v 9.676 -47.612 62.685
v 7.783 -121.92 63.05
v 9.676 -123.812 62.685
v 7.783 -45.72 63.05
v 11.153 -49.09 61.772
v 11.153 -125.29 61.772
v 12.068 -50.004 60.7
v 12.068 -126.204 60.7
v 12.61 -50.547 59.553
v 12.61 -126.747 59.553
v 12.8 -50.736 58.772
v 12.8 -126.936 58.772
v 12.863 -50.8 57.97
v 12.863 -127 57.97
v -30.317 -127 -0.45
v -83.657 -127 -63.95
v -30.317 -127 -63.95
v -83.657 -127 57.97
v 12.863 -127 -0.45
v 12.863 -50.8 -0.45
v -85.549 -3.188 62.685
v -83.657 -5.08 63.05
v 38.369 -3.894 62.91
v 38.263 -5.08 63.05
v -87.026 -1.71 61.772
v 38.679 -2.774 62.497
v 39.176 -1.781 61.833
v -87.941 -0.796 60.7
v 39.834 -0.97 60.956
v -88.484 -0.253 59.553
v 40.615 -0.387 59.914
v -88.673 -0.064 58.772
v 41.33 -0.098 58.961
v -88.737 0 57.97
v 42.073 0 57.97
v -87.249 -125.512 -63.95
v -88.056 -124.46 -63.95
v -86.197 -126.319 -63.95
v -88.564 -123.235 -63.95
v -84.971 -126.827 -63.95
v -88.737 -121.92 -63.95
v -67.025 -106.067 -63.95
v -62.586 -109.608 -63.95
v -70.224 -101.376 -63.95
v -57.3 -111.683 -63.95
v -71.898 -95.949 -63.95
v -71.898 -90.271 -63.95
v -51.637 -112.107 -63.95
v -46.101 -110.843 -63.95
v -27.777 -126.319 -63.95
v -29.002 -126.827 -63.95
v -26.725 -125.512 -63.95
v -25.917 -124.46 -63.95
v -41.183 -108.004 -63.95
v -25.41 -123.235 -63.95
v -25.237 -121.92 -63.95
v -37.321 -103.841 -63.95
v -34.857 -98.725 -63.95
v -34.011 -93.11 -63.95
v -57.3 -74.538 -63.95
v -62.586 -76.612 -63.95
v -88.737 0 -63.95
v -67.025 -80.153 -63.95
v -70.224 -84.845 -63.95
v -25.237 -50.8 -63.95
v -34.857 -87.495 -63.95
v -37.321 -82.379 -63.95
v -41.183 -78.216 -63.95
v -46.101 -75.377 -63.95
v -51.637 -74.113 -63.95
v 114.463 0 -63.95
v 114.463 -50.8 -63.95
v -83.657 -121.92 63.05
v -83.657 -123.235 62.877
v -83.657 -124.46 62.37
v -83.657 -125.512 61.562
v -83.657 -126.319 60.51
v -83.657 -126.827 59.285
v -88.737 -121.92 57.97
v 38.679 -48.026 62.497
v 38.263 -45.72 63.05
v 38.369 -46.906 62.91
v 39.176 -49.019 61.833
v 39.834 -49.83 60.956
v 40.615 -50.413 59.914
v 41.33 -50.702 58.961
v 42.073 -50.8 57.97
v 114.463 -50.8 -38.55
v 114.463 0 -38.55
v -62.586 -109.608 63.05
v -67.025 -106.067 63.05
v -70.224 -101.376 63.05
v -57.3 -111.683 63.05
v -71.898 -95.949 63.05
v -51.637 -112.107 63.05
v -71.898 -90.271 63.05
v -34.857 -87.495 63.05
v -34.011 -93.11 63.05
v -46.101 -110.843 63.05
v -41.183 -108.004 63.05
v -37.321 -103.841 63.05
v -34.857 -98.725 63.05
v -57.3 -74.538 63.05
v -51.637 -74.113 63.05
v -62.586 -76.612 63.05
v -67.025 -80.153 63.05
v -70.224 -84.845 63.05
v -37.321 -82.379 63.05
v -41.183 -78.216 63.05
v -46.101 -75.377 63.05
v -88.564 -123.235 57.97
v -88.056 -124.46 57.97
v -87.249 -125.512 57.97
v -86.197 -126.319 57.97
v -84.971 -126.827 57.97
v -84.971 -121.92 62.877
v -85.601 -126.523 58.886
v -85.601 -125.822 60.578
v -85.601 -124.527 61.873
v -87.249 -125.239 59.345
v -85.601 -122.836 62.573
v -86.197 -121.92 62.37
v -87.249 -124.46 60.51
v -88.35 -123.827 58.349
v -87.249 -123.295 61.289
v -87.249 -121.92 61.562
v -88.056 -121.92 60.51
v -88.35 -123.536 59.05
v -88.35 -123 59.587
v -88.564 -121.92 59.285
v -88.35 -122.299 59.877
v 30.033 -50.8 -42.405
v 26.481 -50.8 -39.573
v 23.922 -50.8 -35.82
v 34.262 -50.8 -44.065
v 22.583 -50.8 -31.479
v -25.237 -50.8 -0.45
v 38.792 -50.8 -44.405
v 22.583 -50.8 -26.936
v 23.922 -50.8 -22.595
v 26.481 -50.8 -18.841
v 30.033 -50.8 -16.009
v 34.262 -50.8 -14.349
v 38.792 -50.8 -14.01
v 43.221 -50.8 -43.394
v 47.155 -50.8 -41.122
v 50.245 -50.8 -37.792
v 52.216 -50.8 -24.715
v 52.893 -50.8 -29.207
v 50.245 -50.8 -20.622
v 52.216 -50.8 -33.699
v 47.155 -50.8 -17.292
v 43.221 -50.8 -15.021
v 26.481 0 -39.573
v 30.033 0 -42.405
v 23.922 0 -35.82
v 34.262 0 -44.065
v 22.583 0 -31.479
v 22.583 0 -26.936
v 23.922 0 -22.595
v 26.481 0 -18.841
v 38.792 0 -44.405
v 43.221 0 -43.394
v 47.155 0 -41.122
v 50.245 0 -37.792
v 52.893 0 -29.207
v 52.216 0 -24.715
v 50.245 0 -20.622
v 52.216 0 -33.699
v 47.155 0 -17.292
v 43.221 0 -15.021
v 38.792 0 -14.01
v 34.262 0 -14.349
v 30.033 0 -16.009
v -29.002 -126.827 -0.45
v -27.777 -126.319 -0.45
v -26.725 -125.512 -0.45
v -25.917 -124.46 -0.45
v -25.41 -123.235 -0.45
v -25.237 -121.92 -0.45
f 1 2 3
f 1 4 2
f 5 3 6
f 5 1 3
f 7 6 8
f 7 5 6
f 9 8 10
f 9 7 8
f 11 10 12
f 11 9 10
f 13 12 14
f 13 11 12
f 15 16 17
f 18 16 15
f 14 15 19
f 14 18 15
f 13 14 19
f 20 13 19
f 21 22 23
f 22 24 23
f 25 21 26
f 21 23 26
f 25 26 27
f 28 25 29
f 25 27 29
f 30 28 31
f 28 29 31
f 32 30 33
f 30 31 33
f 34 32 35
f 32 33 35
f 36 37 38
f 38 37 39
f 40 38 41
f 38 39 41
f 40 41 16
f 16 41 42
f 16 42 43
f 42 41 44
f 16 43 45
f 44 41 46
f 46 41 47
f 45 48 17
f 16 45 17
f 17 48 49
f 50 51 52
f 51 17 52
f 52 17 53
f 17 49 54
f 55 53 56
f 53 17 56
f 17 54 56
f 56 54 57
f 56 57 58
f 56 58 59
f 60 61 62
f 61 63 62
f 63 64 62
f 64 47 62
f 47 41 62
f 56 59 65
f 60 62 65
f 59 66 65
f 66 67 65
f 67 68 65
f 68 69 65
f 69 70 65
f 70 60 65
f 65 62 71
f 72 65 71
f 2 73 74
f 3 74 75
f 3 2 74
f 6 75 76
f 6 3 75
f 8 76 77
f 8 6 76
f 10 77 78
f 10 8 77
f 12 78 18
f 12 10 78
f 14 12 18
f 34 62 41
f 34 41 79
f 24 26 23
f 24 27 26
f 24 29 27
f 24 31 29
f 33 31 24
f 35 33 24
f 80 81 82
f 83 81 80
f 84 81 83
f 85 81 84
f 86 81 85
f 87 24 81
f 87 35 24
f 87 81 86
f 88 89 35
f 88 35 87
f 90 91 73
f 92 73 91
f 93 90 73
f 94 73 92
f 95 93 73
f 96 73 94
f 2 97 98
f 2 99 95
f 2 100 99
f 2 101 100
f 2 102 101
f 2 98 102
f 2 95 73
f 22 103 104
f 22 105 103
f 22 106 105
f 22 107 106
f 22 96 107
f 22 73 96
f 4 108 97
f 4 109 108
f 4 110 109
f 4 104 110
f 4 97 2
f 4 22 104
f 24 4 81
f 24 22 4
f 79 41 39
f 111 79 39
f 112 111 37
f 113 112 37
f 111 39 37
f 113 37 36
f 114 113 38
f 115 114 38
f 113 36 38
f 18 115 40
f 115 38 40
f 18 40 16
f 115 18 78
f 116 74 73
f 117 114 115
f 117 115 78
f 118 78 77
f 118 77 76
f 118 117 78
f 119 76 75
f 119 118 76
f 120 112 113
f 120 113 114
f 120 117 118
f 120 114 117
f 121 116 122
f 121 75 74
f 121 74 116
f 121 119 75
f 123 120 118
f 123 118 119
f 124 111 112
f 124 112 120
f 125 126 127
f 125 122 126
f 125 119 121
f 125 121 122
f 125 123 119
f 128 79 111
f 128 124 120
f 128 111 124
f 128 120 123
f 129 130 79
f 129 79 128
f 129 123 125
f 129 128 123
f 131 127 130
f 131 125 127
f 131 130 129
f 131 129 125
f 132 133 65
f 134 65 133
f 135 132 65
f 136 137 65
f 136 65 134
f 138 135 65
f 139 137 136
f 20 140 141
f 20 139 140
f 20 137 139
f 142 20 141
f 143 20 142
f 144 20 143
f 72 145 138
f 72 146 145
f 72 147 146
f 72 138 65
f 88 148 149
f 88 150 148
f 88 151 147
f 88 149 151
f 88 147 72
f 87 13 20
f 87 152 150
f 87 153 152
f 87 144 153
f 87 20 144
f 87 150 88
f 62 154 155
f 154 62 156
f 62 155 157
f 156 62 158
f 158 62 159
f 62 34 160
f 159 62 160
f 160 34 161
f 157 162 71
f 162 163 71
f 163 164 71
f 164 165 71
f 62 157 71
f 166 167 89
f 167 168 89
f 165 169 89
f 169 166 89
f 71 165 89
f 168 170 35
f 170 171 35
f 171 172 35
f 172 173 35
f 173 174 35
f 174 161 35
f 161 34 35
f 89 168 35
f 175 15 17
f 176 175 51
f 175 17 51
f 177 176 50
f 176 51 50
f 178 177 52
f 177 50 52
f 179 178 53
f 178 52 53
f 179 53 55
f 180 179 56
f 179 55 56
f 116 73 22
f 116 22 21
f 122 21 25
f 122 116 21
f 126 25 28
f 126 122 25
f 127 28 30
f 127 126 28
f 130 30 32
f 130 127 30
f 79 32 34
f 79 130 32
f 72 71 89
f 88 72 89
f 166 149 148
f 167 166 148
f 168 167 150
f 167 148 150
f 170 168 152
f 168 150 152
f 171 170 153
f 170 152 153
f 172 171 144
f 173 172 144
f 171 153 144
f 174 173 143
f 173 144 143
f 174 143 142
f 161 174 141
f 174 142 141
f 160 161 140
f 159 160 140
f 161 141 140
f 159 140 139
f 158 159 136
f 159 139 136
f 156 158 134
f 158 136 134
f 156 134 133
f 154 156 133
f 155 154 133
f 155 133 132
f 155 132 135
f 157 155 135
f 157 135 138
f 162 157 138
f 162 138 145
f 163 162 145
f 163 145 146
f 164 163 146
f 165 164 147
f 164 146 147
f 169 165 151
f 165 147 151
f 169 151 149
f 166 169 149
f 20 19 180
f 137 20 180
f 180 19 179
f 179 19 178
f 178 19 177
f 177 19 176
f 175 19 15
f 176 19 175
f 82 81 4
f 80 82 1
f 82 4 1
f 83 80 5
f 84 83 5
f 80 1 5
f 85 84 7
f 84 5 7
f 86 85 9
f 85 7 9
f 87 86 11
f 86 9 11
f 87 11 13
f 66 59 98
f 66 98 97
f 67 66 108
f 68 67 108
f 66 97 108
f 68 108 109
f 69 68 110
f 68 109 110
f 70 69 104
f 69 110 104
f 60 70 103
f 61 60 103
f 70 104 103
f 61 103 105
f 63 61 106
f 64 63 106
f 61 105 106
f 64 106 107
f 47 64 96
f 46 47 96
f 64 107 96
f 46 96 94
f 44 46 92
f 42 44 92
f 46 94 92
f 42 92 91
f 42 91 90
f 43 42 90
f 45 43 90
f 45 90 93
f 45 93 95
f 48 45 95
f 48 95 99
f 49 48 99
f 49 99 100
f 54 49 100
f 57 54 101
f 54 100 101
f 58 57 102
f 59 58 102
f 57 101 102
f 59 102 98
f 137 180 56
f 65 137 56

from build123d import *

# Parameters (mm, degrees)
F0_W        = 203.2
F0_H        = 127
F1_DEPTH    = 127
F3_DEPTH    = 76.2
F4_SIZE2    = 101.6
F4_SIZE     = 76.2
F5_R        = 5.08
F6_T1_DEPTH = 76.2
F6_T3_DEPTH = 134.62
F6_S7_W     = 5.08
F6_S7_H     = 5.08
F6_T8_DEPTH = 5.08
F7_R        = 15.24
F8_DEPTH    = 50.8
F9_R        = 19.05
F10_DEPTH   = 127


# Not quite as in the source:
# - a fillet or chamfer that OpenCascade refuses, or shapes differently, is made with other operations: its cross-section is extruded or revolved along the edge and cut away or added


with BuildPart() as f1:
    # F0 (on Front) → F1 (new body)
    with BuildSketch(Plane.XZ):
        with Locations((12.863317194, -0.4497872638)):
            Rectangle(F0_W, F0_H)
    extrude(amount=F1_DEPTH)

    # F2 (on face) → F3 (cut)
    with BuildSketch(Plane.XZ.offset(127)):
        Polygon((114.463317194, 63.0502127362), (12.863317194, 63.0502127362), (12.863317194, -0.4497872638), (-25.236682806, -0.4497872638), (-25.236682806, -63.9497872638), (114.463317194, -63.9497872638), align=None)
    extrude(amount=-F3_DEPTH, mode=Mode.SUBTRACT)

    # F4
    f4_edges = [f1.edges().sort_by_distance(p)[0] for p in [
        (114.463317, -25.4, 63.050213),
    ]]
    f4_side = f1.faces().sort_by_distance((-8.908111, -52.614286, 63.050213))[0]
    chamfer(f4_edges, length=F4_SIZE, length2=F4_SIZE2, reference=f4_side)

    # F5
    f5_edges = [f1.edges().sort_by_distance(p)[0] for p in [
        (-37.936683, -127, 63.050213),
        (-88.736683, -63.5, 63.050213),
        (12.863317, -88.9, 63.050213),
        (25.563317, -50.8, 63.050213),
        (-25.236683, 0, 63.050213),
    ]]
    fillet(f5_edges, radius=F5_R)

    # F6: fillet of radius 5.08 on 2 edges, made by hand

    # F6_s2 → F6_t1 (cut)
    with BuildSketch(Plane.XY.offset(-76.6497872638)):
        with BuildLine():
            ThreePointArc((-30.316682806, -127), (-26.7245803576, -125.5121024484), (-25.236682806, -121.92))
            Line((-25.236682806, -121.92), (-25.236682806, -127))
            Line((-25.236682806, -127), (-30.316682806, -127))
        make_face()
    extrude(amount=F6_T1_DEPTH, mode=Mode.SUBTRACT)

    # F6_s4 → F6_t3 (cut)
    with BuildSketch(Plane.XY.offset(-76.6497872638)):
        with BuildLine():
            ThreePointArc((-88.736682806, -121.92), (-87.2487852545, -125.5121024484), (-83.656682806, -127))
            Line((-83.656682806, -127), (-88.736682806, -127))
            Line((-88.736682806, -127), (-88.736682806, -121.92))
        make_face()
    extrude(amount=F6_T3_DEPTH, mode=Mode.SUBTRACT)


with BuildPart() as f6_tool6:
    # F6_s7 → F6_t8 (new body)
    with BuildSketch(Plane.YZ.offset(-83.656682806)):
        with Locations((-124.46, 60.5102127362)):
            Rectangle(F6_S7_W, F6_S7_H)
    extrude(amount=-F6_T8_DEPTH)

    # F6_s9 → F6_t10 (revolve, cut)
    with BuildSketch(Plane(origin=(-83.656682806, -121.92, 57.9702127362), x_dir=(0, 0.7071067812, -0.7071067812), z_dir=(0, 0.7071067812, 0.7071067812))):
        with BuildLine():
            ThreePointArc((0, -5.08), (5.08, 0), (0, 5.08))
            Line((0, 5.08), (0, -5.08))
        make_face()
    revolve(axis=Axis((-83.656682806, -121.92, 57.9702127362), (-1, 0, 0)), mode=Mode.SUBTRACT)


with BuildPart() as f1_1:
    add(f1.part)

    # F6_t5: cut F6_tool6
    add(f6_tool6.part, mode=Mode.SUBTRACT)

    # F7 (on face) → F8 (cut, through all)
    with BuildSketch(Plane.XZ.offset(50.8)):
        with Locations((37.6529693604, -29.2071215808)):
            Circle(F7_R)
    extrude(amount=-F8_DEPTH, mode=Mode.SUBTRACT)

    # F9 (on face) → F10 (cut, through all)
    with BuildSketch(Plane.XY.offset(63.0502127362)):
        with Locations((-53.0607067049, -93.1101441383)):
            Circle(F9_R)
    extrude(amount=-F10_DEPTH, mode=Mode.SUBTRACT)


solid = f1_1.part
